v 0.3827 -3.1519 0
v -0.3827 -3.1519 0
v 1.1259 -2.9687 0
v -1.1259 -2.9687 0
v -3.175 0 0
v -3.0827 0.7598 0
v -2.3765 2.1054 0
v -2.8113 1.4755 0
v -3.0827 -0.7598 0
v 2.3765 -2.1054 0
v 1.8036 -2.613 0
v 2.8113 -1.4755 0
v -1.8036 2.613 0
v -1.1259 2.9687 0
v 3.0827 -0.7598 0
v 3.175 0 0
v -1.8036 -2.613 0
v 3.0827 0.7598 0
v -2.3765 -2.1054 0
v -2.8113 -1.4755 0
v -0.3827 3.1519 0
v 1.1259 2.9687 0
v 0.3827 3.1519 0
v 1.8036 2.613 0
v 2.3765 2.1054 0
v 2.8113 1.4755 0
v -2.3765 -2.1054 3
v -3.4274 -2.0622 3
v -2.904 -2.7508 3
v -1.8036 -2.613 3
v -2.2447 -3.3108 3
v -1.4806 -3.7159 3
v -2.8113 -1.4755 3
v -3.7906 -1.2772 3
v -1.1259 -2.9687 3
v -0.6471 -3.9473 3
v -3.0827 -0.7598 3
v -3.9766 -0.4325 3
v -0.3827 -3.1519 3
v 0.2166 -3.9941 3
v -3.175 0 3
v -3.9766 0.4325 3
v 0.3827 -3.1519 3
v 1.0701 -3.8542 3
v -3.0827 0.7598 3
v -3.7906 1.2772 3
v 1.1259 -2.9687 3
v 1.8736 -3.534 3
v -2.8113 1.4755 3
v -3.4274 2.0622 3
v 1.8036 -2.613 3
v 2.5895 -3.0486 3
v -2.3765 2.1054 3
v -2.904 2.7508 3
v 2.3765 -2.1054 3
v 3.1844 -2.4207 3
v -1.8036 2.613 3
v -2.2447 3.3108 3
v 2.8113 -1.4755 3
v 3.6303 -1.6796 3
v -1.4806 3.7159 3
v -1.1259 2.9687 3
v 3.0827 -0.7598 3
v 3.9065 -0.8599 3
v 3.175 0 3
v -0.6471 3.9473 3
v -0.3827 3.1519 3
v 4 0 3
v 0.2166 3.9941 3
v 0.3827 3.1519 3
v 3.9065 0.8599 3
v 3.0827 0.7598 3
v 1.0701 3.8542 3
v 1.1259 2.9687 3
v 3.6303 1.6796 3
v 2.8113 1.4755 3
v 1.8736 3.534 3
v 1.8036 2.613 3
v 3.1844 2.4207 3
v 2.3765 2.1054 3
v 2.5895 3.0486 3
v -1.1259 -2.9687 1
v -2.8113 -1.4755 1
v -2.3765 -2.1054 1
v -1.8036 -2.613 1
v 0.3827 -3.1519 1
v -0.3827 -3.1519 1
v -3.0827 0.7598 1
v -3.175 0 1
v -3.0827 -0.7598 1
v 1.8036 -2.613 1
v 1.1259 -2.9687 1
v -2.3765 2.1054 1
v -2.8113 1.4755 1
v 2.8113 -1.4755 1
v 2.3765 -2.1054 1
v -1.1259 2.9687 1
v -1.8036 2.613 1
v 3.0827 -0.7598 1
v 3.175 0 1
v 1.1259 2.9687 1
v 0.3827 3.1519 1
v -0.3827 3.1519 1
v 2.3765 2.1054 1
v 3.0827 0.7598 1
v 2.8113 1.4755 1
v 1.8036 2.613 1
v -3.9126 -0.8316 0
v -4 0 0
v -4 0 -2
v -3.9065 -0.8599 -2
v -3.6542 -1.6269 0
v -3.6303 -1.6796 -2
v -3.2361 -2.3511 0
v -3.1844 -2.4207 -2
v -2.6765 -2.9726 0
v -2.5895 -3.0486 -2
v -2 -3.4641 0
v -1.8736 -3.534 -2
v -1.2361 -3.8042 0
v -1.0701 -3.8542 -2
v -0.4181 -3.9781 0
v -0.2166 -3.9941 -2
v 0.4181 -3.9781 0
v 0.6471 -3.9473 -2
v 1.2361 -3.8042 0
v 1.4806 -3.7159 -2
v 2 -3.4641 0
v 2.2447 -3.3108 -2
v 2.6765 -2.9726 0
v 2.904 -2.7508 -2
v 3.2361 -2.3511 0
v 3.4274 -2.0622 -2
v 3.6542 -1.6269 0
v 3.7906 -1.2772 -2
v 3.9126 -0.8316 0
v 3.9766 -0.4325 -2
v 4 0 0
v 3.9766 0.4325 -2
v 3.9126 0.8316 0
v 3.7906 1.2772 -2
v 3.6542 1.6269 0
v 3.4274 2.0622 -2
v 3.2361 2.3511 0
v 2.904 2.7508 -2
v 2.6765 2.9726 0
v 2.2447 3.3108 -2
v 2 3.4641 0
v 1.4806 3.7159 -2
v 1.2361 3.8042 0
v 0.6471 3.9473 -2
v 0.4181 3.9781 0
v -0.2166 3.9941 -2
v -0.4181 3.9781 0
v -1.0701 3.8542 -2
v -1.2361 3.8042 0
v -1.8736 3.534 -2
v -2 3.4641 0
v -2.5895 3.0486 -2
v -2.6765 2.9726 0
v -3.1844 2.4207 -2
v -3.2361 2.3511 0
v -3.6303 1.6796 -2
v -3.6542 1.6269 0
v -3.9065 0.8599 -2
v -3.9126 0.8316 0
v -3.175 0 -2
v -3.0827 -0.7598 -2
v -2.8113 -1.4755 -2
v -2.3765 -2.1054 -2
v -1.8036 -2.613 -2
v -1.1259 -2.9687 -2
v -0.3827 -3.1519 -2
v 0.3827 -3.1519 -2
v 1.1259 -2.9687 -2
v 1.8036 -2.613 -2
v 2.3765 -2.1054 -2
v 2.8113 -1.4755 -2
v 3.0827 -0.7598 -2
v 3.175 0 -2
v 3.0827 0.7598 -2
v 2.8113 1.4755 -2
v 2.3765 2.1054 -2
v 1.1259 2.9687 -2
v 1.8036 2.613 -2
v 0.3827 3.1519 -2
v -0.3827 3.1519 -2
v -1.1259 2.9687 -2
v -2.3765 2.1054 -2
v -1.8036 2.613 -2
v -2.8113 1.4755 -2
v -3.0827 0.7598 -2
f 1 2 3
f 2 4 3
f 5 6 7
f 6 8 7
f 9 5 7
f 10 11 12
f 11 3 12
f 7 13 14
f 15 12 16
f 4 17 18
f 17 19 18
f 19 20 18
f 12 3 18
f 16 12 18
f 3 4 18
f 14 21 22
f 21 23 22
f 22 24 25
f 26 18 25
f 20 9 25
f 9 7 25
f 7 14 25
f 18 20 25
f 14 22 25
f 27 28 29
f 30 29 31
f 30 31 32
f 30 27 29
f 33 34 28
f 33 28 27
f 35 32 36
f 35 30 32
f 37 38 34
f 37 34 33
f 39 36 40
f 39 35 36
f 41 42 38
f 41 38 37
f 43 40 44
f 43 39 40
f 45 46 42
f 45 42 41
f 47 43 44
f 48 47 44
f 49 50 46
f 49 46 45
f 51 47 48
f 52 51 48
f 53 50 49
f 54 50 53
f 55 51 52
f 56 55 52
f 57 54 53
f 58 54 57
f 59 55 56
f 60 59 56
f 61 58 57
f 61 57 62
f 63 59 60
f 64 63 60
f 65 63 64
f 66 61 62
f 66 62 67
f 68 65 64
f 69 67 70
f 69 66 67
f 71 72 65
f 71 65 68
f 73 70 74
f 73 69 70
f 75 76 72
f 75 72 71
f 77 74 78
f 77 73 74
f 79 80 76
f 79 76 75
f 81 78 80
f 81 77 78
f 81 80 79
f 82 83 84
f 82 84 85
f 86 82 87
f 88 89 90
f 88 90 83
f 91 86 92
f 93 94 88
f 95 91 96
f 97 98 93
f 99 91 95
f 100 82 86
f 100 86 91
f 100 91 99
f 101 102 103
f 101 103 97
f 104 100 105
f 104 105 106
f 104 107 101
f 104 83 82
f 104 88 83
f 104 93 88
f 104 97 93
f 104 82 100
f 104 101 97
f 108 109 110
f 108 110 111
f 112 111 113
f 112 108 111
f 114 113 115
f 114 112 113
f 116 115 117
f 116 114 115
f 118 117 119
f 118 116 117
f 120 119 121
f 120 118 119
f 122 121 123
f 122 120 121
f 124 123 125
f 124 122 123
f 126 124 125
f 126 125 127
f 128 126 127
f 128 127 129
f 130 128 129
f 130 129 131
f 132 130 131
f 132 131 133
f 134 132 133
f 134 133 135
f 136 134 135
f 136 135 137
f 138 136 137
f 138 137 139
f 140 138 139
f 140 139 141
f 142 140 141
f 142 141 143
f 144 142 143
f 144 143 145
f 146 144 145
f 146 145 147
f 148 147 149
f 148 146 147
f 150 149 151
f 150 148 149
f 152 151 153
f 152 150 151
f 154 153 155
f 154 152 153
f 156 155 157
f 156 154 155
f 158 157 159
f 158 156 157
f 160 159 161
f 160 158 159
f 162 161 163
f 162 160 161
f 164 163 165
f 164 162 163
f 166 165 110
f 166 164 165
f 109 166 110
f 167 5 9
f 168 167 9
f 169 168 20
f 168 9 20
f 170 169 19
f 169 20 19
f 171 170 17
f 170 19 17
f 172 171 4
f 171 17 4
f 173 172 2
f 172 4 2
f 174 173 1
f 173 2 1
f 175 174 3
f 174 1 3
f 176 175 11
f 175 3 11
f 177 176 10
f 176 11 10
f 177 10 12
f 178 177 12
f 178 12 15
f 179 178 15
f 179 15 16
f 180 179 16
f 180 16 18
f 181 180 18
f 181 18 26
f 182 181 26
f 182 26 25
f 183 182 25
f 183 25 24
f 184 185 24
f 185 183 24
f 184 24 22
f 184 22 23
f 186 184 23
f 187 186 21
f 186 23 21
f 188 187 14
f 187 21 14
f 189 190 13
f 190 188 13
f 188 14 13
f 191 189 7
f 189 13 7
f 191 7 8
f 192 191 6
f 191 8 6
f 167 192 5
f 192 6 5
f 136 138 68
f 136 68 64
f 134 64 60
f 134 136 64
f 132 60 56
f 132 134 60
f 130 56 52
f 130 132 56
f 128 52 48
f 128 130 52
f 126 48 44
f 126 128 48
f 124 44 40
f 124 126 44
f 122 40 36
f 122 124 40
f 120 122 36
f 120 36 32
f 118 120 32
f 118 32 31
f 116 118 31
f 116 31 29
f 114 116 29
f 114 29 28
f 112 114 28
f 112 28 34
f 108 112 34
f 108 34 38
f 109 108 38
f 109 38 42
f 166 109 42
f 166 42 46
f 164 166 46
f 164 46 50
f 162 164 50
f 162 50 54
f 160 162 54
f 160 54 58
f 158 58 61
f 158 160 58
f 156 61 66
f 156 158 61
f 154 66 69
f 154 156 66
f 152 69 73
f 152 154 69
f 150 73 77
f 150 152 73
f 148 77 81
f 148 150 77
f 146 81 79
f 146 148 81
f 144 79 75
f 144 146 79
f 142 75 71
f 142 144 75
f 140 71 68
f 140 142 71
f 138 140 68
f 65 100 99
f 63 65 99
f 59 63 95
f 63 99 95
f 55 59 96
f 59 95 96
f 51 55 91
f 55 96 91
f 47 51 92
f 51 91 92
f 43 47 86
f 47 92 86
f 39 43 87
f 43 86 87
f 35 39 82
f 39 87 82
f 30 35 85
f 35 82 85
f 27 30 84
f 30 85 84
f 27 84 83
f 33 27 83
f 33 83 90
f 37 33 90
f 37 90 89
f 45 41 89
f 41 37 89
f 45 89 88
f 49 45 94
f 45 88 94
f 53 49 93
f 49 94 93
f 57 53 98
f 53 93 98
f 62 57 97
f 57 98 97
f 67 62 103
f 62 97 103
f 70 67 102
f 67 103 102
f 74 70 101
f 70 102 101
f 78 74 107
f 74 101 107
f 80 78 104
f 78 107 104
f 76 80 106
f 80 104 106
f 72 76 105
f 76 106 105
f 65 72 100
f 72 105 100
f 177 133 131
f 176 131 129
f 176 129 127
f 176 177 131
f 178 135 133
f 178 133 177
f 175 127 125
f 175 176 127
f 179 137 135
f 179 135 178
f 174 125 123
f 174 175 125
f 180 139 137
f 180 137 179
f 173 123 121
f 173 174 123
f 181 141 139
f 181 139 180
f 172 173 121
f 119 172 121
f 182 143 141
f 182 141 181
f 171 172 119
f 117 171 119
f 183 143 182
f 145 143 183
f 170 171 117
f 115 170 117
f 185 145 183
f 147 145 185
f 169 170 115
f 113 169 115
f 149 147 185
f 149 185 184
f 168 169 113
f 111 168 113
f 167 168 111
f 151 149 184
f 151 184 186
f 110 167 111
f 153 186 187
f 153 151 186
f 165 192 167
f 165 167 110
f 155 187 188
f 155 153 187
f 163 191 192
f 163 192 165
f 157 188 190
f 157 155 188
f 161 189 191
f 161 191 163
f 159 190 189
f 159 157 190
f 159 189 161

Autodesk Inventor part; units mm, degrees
ref_plane "YZ Plane" through (0, 0, 0) normal (1, 0, 0) x (0, 1, 0)
ref_plane "XZ Plane" through (0, 0, 0) normal (0, 1, 0) x (-1, 0, 0)
ref_plane "XY Plane" through (0, 0, 0) normal (0, 0, 1) x (1, 0, 0)
sketch "Sketch1" plane through (0, 0, 0) normal (0, 0, 1) x (1, 0, 0)
  circle A0 centre (0, 0) radius 4
  circle A1 centre (0, 0) radius 3.175
  dimension "d0" = 8
  dimension "d1" = 6.35
extrude "Extrusion1" add sketch "Sketch1" along normal blind 1 contours A0 | A1
sketch "Sketch2" plane through (0, 0, 1) normal (0, 0, 1) x (1, 0, 0)
  circle A0 centre (0, 0) radius 4 projected
  circle A1 centre (0, 0) radius 4
  circle A2 centre (0, 0) radius 3.175
  dimension "d4" = 8
  dimension "d5" = 6.35
extrude "Extrusion2" add sketch "Sketch2" along normal blind 2
sketch "Sketch3" plane through (0, 0, 0) normal (0, 0, -1) x (-1, 0, 0)
  circle A0 centre (0, 0) radius 4 projected
  circle A1 centre (0, 0) radius 4
  circle A2 centre (0, 0) radius 3.175
  dimension "d8" = 8
  dimension "d9" = 6.35
extrude "Extrusion3" add sketch "Sketch3" along normal blind 2
properties part number "Pusher.Midplate"
